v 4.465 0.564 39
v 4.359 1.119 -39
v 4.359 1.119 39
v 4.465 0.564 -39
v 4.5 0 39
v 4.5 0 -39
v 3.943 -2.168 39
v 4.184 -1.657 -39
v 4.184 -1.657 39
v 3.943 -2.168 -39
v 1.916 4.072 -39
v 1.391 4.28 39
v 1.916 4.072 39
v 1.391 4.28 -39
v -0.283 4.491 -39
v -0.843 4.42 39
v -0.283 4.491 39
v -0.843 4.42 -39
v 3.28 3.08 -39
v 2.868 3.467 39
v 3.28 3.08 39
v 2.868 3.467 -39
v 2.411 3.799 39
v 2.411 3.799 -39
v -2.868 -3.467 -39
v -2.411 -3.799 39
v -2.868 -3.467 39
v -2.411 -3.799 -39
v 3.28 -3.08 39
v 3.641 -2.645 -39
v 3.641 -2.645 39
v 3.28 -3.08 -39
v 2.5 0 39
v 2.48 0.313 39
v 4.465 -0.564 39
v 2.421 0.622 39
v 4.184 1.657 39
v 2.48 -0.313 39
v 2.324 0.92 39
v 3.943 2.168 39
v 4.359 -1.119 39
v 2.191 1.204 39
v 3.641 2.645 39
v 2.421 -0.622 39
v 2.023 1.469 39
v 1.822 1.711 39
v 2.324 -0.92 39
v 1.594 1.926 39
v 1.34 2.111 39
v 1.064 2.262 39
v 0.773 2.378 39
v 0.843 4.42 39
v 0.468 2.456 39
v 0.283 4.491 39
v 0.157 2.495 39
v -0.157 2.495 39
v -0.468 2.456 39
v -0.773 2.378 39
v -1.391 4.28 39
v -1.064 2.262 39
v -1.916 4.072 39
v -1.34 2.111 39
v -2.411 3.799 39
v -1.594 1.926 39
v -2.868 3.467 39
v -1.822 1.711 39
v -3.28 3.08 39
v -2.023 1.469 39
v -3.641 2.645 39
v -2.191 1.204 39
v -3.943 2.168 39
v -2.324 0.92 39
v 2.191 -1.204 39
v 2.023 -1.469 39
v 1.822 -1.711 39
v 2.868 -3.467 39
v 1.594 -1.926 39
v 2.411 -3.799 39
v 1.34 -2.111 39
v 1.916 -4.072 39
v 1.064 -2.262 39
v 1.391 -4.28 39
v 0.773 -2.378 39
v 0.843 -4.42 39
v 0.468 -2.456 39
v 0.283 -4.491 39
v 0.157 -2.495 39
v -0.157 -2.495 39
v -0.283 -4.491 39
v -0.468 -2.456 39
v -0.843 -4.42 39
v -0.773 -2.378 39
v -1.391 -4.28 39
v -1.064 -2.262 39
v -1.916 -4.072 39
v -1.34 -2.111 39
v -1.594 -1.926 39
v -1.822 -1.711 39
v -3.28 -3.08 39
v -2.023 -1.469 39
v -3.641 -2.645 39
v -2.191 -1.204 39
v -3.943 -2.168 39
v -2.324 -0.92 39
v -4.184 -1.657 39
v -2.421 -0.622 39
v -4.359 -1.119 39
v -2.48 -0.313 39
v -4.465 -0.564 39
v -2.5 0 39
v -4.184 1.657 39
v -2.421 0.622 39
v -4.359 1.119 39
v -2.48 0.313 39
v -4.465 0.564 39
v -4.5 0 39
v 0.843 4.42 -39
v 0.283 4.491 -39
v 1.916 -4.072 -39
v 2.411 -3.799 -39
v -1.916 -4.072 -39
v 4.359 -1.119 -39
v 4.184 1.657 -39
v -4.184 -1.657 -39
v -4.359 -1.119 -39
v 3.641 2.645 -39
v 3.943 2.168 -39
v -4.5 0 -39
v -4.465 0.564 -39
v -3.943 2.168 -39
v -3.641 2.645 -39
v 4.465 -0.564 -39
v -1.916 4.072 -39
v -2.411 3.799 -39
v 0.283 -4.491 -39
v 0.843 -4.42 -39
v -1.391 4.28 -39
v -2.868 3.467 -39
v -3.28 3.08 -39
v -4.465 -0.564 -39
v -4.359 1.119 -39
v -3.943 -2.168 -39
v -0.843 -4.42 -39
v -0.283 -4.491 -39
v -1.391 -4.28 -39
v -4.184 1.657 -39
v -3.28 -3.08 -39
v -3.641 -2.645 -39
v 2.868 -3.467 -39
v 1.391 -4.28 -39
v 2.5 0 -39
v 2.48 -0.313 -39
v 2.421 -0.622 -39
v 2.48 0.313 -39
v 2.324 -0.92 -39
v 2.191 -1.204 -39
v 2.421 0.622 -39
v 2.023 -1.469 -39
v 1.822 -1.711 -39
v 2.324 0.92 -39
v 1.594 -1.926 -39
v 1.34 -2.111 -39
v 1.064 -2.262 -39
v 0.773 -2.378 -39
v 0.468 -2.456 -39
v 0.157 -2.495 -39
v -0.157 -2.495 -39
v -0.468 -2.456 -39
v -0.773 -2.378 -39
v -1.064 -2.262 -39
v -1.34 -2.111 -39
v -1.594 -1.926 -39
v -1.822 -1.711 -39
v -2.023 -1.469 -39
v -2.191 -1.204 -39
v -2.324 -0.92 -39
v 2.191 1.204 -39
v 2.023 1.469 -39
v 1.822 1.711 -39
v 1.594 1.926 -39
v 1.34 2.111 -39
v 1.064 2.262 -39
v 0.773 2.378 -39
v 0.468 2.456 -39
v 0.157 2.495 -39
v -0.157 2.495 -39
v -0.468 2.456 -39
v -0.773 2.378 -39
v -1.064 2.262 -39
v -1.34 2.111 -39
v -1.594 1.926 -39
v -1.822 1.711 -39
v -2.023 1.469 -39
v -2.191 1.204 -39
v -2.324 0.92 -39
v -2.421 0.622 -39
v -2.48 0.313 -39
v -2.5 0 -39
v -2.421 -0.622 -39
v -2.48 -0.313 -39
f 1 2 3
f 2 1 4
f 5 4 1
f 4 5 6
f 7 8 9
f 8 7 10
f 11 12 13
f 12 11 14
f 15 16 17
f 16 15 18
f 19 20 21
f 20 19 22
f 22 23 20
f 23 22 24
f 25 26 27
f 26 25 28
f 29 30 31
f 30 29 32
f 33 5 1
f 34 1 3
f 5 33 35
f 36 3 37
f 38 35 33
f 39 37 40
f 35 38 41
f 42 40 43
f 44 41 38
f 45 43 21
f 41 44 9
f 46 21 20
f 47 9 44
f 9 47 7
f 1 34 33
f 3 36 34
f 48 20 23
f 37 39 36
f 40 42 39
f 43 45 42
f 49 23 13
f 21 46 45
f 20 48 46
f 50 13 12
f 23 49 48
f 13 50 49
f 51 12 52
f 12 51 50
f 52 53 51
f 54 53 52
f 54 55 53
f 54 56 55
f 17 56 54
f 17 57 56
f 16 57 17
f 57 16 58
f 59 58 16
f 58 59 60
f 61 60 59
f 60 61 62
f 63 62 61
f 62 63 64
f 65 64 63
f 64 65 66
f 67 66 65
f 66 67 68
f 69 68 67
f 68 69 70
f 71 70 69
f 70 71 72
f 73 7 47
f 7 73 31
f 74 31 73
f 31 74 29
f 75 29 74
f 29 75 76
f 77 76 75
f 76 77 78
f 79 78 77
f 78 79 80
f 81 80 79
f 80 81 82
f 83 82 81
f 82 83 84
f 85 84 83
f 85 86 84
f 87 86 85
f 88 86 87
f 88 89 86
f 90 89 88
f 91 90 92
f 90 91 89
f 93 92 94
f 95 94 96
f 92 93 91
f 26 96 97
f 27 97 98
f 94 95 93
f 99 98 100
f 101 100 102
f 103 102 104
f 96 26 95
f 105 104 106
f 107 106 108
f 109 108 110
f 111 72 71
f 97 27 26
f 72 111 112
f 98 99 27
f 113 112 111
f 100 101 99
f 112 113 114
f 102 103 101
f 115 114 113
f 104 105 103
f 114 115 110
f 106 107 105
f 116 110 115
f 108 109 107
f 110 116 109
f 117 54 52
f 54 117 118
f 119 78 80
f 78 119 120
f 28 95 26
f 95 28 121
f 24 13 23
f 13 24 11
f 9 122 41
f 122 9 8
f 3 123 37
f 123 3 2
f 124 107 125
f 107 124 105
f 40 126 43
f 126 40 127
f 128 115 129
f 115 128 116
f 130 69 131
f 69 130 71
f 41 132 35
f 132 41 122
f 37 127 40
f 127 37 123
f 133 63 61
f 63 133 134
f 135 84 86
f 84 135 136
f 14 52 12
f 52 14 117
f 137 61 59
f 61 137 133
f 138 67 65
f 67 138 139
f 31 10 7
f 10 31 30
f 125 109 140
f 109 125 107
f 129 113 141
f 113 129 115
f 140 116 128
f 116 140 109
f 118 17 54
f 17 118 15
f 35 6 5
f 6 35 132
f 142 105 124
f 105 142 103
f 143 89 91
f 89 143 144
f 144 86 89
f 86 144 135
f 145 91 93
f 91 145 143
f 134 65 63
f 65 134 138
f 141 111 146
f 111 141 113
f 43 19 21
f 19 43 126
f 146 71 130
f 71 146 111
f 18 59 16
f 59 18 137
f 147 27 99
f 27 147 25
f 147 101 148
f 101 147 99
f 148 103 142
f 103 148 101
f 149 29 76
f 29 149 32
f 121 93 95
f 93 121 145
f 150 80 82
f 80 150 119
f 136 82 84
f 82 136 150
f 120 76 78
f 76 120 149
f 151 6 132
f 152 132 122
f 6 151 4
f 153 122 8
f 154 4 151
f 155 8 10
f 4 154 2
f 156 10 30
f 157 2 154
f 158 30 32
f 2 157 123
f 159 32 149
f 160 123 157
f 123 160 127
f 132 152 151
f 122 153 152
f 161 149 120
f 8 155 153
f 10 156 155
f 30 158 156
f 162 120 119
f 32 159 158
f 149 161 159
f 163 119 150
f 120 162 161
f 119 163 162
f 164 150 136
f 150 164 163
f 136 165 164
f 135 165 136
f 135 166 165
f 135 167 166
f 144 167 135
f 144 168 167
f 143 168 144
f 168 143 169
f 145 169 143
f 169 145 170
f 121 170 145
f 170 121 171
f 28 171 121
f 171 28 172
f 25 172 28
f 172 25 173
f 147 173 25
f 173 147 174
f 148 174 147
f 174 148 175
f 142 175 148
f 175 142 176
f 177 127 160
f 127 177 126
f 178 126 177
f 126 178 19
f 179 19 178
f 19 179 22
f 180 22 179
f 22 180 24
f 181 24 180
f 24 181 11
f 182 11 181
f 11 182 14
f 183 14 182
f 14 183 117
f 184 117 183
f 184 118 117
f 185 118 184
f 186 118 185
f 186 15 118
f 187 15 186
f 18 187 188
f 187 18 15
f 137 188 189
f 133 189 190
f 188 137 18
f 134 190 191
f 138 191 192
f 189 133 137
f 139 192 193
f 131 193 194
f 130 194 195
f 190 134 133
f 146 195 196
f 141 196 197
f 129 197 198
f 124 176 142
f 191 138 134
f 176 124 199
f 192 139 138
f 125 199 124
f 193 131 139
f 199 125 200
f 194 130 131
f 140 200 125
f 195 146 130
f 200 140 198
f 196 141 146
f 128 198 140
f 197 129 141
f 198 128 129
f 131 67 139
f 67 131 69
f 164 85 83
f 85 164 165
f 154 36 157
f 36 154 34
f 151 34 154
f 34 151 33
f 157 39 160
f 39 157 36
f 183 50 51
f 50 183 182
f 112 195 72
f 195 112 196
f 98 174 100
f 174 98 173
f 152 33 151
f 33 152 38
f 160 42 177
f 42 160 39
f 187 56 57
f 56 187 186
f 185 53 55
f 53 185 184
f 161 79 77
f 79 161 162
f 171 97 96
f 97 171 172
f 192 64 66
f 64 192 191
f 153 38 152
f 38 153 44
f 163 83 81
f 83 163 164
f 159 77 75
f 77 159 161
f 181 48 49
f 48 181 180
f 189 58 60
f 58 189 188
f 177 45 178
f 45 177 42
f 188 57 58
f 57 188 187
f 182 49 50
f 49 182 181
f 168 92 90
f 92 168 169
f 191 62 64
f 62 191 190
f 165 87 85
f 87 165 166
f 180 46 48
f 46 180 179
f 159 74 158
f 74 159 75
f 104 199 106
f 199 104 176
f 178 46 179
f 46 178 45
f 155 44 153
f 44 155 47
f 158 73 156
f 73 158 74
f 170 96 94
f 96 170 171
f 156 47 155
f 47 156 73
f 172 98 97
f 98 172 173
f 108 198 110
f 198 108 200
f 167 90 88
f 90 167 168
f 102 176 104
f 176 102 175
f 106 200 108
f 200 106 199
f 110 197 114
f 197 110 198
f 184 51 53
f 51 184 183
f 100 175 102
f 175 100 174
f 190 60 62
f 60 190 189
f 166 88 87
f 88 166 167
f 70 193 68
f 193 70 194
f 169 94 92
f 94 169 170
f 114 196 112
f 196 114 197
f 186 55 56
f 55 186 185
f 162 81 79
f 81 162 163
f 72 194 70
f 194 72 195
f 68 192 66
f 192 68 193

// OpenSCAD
$fn = 50;


difference() {
	union() {
		translate(v = [0, 0, -39.0000000000]) {
			cylinder(h = 78, r = 4.5000000000);
		}
	}
	union() {
		translate(v = [0, 0, -100.0000000000]) {
			cylinder(h = 200, r = 2.5000000000);
		}
	}
}
